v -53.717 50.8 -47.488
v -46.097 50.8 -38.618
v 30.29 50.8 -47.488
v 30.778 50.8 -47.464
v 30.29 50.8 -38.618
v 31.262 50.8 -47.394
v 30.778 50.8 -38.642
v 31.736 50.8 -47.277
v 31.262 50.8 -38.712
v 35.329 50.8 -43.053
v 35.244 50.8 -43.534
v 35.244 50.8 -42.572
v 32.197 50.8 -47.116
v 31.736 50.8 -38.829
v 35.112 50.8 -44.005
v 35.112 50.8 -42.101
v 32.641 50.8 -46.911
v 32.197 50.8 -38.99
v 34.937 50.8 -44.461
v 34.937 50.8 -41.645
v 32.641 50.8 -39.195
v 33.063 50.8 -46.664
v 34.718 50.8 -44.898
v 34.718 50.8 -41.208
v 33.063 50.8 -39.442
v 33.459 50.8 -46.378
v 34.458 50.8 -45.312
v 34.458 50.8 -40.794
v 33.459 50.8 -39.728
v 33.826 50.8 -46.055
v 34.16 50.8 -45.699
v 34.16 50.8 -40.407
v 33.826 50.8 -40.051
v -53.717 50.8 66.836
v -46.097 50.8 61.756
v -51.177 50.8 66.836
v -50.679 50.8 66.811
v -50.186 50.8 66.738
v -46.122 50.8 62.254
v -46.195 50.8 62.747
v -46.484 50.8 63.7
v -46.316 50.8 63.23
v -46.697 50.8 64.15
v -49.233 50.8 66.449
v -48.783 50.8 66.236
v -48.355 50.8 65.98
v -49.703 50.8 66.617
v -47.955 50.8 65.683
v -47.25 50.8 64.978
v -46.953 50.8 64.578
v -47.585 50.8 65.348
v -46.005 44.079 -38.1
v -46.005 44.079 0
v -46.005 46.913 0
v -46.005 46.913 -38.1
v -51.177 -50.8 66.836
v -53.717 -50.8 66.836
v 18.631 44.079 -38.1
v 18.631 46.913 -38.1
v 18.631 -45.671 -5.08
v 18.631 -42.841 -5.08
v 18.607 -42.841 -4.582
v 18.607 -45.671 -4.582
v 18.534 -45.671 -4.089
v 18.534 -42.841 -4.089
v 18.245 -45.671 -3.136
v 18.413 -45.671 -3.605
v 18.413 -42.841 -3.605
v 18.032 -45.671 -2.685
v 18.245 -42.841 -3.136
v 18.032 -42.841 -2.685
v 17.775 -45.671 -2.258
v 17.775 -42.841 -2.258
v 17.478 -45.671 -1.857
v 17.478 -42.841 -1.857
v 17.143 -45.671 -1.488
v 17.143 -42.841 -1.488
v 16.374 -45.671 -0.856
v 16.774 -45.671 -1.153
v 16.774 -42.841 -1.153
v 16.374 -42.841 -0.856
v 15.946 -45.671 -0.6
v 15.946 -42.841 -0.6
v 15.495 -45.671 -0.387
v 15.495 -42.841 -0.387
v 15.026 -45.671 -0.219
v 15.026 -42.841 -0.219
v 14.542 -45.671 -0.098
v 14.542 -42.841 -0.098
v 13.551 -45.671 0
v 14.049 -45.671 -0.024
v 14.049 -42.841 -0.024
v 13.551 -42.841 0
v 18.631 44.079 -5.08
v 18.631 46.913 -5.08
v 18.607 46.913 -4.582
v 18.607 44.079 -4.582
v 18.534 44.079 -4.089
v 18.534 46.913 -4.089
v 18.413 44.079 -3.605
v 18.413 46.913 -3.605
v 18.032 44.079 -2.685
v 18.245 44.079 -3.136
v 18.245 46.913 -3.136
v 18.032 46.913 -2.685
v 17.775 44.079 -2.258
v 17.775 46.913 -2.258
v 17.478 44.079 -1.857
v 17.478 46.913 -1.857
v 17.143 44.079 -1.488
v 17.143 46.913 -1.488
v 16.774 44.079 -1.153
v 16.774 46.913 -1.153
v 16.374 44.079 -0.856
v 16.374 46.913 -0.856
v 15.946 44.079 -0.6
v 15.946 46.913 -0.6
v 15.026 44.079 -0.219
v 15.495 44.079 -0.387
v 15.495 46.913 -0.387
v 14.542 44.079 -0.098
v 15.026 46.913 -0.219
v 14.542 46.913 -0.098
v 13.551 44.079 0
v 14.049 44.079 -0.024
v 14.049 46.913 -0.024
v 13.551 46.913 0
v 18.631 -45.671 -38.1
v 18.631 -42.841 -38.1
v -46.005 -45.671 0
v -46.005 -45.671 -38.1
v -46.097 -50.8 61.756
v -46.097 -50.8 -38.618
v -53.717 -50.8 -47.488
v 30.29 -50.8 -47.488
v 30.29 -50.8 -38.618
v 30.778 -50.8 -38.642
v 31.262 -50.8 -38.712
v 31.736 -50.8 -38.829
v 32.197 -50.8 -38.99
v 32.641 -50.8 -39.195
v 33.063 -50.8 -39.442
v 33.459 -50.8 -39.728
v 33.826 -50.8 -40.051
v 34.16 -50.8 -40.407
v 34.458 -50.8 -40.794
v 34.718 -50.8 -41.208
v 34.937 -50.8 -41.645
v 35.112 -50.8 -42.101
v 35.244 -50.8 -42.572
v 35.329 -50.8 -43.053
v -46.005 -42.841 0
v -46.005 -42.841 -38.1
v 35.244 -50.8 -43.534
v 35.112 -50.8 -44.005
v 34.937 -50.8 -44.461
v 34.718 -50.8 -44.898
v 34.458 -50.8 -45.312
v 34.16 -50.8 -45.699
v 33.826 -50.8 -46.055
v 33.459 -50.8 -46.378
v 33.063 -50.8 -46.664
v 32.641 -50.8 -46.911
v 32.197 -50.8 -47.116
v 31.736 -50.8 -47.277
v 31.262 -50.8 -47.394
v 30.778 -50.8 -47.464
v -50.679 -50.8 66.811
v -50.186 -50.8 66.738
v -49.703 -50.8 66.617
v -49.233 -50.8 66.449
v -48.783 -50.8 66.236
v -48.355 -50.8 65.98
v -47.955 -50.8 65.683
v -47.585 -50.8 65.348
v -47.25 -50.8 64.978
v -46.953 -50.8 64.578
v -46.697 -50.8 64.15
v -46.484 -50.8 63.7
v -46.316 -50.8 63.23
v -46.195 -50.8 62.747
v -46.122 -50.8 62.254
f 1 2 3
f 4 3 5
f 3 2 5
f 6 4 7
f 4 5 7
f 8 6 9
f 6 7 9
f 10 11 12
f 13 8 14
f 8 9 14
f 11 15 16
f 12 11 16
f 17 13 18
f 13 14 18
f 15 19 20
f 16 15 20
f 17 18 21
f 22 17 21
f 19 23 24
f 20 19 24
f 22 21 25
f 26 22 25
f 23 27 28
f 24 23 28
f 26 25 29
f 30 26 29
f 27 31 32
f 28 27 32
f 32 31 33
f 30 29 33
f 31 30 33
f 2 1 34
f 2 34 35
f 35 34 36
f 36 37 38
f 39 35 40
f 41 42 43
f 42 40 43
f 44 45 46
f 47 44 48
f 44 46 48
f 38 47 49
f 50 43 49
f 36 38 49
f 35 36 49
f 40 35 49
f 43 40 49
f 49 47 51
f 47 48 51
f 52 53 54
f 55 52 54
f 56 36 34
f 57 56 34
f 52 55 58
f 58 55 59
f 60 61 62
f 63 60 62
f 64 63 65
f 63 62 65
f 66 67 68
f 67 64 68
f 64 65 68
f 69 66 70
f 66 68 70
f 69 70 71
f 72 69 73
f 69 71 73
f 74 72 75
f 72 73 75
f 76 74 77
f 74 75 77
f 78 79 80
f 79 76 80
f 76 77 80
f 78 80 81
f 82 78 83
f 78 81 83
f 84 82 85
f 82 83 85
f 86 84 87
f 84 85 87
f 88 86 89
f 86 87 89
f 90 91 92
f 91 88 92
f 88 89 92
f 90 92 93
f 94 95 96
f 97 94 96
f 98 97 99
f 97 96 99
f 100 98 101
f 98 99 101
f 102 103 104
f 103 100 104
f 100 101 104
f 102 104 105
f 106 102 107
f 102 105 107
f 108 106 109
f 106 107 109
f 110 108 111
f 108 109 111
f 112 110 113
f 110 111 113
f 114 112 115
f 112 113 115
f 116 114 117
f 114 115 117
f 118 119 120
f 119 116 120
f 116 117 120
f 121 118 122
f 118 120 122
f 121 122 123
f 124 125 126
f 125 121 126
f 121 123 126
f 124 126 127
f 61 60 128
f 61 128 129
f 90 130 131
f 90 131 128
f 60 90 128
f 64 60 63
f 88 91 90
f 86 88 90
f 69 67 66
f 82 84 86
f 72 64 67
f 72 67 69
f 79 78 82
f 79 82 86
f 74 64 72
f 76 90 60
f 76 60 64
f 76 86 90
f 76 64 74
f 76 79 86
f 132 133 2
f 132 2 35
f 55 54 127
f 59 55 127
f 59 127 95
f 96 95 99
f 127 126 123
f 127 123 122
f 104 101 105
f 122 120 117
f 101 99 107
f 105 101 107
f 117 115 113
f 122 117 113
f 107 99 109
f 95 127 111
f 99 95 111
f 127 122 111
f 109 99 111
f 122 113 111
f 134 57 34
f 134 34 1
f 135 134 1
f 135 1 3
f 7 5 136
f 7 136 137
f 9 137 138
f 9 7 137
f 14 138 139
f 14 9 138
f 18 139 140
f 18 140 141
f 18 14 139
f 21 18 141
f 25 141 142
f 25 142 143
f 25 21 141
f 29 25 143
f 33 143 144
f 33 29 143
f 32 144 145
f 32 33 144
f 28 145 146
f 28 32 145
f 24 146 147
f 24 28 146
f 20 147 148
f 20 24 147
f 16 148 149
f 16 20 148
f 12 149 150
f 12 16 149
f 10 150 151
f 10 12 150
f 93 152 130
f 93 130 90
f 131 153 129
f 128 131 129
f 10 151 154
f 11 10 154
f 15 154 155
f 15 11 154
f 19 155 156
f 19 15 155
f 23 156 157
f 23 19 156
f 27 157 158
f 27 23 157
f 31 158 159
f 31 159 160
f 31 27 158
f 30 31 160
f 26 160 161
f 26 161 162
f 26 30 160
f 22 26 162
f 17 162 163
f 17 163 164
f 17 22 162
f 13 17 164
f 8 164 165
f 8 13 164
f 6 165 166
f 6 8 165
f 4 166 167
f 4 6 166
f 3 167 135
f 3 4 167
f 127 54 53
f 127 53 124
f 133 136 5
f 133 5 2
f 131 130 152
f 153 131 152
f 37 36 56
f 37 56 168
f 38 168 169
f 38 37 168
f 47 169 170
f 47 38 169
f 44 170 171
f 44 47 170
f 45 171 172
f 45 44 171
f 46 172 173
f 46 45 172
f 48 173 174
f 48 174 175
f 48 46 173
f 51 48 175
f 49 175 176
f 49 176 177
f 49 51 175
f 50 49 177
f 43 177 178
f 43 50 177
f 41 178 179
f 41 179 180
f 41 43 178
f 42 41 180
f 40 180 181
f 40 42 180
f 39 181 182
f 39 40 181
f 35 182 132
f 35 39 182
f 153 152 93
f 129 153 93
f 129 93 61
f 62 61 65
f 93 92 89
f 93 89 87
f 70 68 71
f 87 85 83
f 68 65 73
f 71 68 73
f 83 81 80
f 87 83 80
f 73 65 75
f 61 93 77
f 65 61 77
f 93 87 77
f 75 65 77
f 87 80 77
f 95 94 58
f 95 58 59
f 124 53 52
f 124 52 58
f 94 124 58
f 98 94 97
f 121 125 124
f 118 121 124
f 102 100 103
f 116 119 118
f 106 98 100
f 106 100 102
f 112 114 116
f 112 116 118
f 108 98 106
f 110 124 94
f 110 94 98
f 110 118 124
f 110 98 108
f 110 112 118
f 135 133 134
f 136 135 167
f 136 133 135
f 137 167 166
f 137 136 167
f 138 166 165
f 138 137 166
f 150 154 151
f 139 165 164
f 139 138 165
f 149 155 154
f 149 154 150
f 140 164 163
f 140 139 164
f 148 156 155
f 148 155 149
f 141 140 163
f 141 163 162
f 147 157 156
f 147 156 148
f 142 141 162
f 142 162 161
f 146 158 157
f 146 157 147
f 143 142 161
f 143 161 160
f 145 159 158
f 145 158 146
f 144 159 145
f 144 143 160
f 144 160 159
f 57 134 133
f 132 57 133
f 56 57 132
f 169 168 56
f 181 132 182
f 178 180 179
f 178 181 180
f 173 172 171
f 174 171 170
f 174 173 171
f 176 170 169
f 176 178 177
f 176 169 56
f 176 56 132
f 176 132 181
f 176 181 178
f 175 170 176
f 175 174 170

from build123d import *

# Parameters (mm, degrees)
F1_DEPTH      = 50.8
F2_W          = 64.6359566599
F2_H          = 2.8338059783
F3_DEPTH      = 38.1
F2_H_2        = 2.8299428523
F4_T1_DEPTH   = 127
F4_2_T1_DEPTH = 28.2338059783
F4_3_T1_DEPTH = 28.2299428523


# Not quite as in the source:
# - a fillet or chamfer that OpenCascade refuses, or shapes differently, is made with other operations: its cross-section is extruded or revolved along the edge and cut away or added


with BuildPart() as f1:
    # F0 (on Front) → F1 (new body, symmetric)
    with BuildSketch(Plane.XZ):
        Polygon((-46.0972779441, 66.8356441736), (-53.7172779441, 66.8356441736), (-53.7172779441, -47.4876239896), (-46.1948015571, -47.4876239896), (35.3699997067, -47.4876239896), (35.3699997067, -38.6183932424), (-46.0972779441, -38.6183932424), align=None)
    extrude(amount=F1_DEPTH, both=True)

    # F4: fillet of radius 5.08 on 3 edges, made by hand

    # F4_s2 → F4_t1 (cut)
    with BuildSketch(Plane.XZ.offset(-63.5)):
        with BuildLine():
            ThreePointArc((30.2899997067, -38.6183932424), (33.8821021552, -40.1062907939), (35.3699997067, -43.6983932424))
            Line((35.3699997067, -43.6983932424), (35.3699997067, -38.6183932424))
            Line((35.3699997067, -38.6183932424), (30.2899997067, -38.6183932424))
        make_face()
        with BuildLine():
            ThreePointArc((35.3699997067, -42.4076239896), (33.8821021552, -45.999726438), (30.2899997067, -47.4876239896))
            Line((30.2899997067, -47.4876239896), (35.3699997067, -47.4876239896))
            Line((35.3699997067, -47.4876239896), (35.3699997067, -42.4076239896))
        make_face()
        with BuildLine():
            ThreePointArc((-51.1772779441, 66.8356441736), (-47.5851754957, 65.347746622), (-46.0972779441, 61.7556441736))
            Line((-46.0972779441, 61.7556441736), (-46.0972779441, 66.8356441736))
            Line((-46.0972779441, 66.8356441736), (-51.1772779441, 66.8356441736))
        make_face()
    extrude(amount=F4_T1_DEPTH, mode=Mode.SUBTRACT)


with BuildPart() as f3:
    # F2 (on Top) → F3 (new body)
    with BuildSketch(Plane.XY):
        with Locations((-13.6866262183, 45.4956106842)):
            Rectangle(F2_W, F2_H)
    extrude(amount=-F3_DEPTH)

    # F4#2: fillet of radius 5.08 on 1 edges, made by hand

    # F4_2_s2 → F4_2_t1 (cut)
    with BuildSketch(Plane.XZ.offset(-59.6125136733)):
        with BuildLine():
            ThreePointArc((18.6313521117, -5.08), (17.1434545601, -1.4878975516), (13.5513521117, 0))
            Line((13.5513521117, 0), (18.6313521117, 0))
            Line((18.6313521117, 0), (18.6313521117, -5.08))
        make_face()
    extrude(amount=F4_2_T1_DEPTH, mode=Mode.SUBTRACT)


with BuildPart() as f3b:
    # F2 (on Top) → F3, piece 2 (new body)
    with BuildSketch(Plane.XY):
        with Locations((-13.6866262183, -44.2556086928)):
            Rectangle(F2_W, F2_H_2)
    extrude(amount=-F3_DEPTH)

    # F4#3: fillet of radius 5.08 on 1 edges, made by hand

    # F4_3_s2 → F4_3_t1 (cut)
    with BuildSketch(Plane.XZ.offset(30.1406372666)):
        with BuildLine():
            ThreePointArc((18.6313521117, -5.08), (17.1434545601, -1.4878975516), (13.5513521117, 0))
            Line((13.5513521117, 0), (18.6313521117, 0))
            Line((18.6313521117, 0), (18.6313521117, -5.08))
        make_face()
    extrude(amount=F4_3_T1_DEPTH, mode=Mode.SUBTRACT)


solid = Compound([f1.part, f3.part, f3b.part])
